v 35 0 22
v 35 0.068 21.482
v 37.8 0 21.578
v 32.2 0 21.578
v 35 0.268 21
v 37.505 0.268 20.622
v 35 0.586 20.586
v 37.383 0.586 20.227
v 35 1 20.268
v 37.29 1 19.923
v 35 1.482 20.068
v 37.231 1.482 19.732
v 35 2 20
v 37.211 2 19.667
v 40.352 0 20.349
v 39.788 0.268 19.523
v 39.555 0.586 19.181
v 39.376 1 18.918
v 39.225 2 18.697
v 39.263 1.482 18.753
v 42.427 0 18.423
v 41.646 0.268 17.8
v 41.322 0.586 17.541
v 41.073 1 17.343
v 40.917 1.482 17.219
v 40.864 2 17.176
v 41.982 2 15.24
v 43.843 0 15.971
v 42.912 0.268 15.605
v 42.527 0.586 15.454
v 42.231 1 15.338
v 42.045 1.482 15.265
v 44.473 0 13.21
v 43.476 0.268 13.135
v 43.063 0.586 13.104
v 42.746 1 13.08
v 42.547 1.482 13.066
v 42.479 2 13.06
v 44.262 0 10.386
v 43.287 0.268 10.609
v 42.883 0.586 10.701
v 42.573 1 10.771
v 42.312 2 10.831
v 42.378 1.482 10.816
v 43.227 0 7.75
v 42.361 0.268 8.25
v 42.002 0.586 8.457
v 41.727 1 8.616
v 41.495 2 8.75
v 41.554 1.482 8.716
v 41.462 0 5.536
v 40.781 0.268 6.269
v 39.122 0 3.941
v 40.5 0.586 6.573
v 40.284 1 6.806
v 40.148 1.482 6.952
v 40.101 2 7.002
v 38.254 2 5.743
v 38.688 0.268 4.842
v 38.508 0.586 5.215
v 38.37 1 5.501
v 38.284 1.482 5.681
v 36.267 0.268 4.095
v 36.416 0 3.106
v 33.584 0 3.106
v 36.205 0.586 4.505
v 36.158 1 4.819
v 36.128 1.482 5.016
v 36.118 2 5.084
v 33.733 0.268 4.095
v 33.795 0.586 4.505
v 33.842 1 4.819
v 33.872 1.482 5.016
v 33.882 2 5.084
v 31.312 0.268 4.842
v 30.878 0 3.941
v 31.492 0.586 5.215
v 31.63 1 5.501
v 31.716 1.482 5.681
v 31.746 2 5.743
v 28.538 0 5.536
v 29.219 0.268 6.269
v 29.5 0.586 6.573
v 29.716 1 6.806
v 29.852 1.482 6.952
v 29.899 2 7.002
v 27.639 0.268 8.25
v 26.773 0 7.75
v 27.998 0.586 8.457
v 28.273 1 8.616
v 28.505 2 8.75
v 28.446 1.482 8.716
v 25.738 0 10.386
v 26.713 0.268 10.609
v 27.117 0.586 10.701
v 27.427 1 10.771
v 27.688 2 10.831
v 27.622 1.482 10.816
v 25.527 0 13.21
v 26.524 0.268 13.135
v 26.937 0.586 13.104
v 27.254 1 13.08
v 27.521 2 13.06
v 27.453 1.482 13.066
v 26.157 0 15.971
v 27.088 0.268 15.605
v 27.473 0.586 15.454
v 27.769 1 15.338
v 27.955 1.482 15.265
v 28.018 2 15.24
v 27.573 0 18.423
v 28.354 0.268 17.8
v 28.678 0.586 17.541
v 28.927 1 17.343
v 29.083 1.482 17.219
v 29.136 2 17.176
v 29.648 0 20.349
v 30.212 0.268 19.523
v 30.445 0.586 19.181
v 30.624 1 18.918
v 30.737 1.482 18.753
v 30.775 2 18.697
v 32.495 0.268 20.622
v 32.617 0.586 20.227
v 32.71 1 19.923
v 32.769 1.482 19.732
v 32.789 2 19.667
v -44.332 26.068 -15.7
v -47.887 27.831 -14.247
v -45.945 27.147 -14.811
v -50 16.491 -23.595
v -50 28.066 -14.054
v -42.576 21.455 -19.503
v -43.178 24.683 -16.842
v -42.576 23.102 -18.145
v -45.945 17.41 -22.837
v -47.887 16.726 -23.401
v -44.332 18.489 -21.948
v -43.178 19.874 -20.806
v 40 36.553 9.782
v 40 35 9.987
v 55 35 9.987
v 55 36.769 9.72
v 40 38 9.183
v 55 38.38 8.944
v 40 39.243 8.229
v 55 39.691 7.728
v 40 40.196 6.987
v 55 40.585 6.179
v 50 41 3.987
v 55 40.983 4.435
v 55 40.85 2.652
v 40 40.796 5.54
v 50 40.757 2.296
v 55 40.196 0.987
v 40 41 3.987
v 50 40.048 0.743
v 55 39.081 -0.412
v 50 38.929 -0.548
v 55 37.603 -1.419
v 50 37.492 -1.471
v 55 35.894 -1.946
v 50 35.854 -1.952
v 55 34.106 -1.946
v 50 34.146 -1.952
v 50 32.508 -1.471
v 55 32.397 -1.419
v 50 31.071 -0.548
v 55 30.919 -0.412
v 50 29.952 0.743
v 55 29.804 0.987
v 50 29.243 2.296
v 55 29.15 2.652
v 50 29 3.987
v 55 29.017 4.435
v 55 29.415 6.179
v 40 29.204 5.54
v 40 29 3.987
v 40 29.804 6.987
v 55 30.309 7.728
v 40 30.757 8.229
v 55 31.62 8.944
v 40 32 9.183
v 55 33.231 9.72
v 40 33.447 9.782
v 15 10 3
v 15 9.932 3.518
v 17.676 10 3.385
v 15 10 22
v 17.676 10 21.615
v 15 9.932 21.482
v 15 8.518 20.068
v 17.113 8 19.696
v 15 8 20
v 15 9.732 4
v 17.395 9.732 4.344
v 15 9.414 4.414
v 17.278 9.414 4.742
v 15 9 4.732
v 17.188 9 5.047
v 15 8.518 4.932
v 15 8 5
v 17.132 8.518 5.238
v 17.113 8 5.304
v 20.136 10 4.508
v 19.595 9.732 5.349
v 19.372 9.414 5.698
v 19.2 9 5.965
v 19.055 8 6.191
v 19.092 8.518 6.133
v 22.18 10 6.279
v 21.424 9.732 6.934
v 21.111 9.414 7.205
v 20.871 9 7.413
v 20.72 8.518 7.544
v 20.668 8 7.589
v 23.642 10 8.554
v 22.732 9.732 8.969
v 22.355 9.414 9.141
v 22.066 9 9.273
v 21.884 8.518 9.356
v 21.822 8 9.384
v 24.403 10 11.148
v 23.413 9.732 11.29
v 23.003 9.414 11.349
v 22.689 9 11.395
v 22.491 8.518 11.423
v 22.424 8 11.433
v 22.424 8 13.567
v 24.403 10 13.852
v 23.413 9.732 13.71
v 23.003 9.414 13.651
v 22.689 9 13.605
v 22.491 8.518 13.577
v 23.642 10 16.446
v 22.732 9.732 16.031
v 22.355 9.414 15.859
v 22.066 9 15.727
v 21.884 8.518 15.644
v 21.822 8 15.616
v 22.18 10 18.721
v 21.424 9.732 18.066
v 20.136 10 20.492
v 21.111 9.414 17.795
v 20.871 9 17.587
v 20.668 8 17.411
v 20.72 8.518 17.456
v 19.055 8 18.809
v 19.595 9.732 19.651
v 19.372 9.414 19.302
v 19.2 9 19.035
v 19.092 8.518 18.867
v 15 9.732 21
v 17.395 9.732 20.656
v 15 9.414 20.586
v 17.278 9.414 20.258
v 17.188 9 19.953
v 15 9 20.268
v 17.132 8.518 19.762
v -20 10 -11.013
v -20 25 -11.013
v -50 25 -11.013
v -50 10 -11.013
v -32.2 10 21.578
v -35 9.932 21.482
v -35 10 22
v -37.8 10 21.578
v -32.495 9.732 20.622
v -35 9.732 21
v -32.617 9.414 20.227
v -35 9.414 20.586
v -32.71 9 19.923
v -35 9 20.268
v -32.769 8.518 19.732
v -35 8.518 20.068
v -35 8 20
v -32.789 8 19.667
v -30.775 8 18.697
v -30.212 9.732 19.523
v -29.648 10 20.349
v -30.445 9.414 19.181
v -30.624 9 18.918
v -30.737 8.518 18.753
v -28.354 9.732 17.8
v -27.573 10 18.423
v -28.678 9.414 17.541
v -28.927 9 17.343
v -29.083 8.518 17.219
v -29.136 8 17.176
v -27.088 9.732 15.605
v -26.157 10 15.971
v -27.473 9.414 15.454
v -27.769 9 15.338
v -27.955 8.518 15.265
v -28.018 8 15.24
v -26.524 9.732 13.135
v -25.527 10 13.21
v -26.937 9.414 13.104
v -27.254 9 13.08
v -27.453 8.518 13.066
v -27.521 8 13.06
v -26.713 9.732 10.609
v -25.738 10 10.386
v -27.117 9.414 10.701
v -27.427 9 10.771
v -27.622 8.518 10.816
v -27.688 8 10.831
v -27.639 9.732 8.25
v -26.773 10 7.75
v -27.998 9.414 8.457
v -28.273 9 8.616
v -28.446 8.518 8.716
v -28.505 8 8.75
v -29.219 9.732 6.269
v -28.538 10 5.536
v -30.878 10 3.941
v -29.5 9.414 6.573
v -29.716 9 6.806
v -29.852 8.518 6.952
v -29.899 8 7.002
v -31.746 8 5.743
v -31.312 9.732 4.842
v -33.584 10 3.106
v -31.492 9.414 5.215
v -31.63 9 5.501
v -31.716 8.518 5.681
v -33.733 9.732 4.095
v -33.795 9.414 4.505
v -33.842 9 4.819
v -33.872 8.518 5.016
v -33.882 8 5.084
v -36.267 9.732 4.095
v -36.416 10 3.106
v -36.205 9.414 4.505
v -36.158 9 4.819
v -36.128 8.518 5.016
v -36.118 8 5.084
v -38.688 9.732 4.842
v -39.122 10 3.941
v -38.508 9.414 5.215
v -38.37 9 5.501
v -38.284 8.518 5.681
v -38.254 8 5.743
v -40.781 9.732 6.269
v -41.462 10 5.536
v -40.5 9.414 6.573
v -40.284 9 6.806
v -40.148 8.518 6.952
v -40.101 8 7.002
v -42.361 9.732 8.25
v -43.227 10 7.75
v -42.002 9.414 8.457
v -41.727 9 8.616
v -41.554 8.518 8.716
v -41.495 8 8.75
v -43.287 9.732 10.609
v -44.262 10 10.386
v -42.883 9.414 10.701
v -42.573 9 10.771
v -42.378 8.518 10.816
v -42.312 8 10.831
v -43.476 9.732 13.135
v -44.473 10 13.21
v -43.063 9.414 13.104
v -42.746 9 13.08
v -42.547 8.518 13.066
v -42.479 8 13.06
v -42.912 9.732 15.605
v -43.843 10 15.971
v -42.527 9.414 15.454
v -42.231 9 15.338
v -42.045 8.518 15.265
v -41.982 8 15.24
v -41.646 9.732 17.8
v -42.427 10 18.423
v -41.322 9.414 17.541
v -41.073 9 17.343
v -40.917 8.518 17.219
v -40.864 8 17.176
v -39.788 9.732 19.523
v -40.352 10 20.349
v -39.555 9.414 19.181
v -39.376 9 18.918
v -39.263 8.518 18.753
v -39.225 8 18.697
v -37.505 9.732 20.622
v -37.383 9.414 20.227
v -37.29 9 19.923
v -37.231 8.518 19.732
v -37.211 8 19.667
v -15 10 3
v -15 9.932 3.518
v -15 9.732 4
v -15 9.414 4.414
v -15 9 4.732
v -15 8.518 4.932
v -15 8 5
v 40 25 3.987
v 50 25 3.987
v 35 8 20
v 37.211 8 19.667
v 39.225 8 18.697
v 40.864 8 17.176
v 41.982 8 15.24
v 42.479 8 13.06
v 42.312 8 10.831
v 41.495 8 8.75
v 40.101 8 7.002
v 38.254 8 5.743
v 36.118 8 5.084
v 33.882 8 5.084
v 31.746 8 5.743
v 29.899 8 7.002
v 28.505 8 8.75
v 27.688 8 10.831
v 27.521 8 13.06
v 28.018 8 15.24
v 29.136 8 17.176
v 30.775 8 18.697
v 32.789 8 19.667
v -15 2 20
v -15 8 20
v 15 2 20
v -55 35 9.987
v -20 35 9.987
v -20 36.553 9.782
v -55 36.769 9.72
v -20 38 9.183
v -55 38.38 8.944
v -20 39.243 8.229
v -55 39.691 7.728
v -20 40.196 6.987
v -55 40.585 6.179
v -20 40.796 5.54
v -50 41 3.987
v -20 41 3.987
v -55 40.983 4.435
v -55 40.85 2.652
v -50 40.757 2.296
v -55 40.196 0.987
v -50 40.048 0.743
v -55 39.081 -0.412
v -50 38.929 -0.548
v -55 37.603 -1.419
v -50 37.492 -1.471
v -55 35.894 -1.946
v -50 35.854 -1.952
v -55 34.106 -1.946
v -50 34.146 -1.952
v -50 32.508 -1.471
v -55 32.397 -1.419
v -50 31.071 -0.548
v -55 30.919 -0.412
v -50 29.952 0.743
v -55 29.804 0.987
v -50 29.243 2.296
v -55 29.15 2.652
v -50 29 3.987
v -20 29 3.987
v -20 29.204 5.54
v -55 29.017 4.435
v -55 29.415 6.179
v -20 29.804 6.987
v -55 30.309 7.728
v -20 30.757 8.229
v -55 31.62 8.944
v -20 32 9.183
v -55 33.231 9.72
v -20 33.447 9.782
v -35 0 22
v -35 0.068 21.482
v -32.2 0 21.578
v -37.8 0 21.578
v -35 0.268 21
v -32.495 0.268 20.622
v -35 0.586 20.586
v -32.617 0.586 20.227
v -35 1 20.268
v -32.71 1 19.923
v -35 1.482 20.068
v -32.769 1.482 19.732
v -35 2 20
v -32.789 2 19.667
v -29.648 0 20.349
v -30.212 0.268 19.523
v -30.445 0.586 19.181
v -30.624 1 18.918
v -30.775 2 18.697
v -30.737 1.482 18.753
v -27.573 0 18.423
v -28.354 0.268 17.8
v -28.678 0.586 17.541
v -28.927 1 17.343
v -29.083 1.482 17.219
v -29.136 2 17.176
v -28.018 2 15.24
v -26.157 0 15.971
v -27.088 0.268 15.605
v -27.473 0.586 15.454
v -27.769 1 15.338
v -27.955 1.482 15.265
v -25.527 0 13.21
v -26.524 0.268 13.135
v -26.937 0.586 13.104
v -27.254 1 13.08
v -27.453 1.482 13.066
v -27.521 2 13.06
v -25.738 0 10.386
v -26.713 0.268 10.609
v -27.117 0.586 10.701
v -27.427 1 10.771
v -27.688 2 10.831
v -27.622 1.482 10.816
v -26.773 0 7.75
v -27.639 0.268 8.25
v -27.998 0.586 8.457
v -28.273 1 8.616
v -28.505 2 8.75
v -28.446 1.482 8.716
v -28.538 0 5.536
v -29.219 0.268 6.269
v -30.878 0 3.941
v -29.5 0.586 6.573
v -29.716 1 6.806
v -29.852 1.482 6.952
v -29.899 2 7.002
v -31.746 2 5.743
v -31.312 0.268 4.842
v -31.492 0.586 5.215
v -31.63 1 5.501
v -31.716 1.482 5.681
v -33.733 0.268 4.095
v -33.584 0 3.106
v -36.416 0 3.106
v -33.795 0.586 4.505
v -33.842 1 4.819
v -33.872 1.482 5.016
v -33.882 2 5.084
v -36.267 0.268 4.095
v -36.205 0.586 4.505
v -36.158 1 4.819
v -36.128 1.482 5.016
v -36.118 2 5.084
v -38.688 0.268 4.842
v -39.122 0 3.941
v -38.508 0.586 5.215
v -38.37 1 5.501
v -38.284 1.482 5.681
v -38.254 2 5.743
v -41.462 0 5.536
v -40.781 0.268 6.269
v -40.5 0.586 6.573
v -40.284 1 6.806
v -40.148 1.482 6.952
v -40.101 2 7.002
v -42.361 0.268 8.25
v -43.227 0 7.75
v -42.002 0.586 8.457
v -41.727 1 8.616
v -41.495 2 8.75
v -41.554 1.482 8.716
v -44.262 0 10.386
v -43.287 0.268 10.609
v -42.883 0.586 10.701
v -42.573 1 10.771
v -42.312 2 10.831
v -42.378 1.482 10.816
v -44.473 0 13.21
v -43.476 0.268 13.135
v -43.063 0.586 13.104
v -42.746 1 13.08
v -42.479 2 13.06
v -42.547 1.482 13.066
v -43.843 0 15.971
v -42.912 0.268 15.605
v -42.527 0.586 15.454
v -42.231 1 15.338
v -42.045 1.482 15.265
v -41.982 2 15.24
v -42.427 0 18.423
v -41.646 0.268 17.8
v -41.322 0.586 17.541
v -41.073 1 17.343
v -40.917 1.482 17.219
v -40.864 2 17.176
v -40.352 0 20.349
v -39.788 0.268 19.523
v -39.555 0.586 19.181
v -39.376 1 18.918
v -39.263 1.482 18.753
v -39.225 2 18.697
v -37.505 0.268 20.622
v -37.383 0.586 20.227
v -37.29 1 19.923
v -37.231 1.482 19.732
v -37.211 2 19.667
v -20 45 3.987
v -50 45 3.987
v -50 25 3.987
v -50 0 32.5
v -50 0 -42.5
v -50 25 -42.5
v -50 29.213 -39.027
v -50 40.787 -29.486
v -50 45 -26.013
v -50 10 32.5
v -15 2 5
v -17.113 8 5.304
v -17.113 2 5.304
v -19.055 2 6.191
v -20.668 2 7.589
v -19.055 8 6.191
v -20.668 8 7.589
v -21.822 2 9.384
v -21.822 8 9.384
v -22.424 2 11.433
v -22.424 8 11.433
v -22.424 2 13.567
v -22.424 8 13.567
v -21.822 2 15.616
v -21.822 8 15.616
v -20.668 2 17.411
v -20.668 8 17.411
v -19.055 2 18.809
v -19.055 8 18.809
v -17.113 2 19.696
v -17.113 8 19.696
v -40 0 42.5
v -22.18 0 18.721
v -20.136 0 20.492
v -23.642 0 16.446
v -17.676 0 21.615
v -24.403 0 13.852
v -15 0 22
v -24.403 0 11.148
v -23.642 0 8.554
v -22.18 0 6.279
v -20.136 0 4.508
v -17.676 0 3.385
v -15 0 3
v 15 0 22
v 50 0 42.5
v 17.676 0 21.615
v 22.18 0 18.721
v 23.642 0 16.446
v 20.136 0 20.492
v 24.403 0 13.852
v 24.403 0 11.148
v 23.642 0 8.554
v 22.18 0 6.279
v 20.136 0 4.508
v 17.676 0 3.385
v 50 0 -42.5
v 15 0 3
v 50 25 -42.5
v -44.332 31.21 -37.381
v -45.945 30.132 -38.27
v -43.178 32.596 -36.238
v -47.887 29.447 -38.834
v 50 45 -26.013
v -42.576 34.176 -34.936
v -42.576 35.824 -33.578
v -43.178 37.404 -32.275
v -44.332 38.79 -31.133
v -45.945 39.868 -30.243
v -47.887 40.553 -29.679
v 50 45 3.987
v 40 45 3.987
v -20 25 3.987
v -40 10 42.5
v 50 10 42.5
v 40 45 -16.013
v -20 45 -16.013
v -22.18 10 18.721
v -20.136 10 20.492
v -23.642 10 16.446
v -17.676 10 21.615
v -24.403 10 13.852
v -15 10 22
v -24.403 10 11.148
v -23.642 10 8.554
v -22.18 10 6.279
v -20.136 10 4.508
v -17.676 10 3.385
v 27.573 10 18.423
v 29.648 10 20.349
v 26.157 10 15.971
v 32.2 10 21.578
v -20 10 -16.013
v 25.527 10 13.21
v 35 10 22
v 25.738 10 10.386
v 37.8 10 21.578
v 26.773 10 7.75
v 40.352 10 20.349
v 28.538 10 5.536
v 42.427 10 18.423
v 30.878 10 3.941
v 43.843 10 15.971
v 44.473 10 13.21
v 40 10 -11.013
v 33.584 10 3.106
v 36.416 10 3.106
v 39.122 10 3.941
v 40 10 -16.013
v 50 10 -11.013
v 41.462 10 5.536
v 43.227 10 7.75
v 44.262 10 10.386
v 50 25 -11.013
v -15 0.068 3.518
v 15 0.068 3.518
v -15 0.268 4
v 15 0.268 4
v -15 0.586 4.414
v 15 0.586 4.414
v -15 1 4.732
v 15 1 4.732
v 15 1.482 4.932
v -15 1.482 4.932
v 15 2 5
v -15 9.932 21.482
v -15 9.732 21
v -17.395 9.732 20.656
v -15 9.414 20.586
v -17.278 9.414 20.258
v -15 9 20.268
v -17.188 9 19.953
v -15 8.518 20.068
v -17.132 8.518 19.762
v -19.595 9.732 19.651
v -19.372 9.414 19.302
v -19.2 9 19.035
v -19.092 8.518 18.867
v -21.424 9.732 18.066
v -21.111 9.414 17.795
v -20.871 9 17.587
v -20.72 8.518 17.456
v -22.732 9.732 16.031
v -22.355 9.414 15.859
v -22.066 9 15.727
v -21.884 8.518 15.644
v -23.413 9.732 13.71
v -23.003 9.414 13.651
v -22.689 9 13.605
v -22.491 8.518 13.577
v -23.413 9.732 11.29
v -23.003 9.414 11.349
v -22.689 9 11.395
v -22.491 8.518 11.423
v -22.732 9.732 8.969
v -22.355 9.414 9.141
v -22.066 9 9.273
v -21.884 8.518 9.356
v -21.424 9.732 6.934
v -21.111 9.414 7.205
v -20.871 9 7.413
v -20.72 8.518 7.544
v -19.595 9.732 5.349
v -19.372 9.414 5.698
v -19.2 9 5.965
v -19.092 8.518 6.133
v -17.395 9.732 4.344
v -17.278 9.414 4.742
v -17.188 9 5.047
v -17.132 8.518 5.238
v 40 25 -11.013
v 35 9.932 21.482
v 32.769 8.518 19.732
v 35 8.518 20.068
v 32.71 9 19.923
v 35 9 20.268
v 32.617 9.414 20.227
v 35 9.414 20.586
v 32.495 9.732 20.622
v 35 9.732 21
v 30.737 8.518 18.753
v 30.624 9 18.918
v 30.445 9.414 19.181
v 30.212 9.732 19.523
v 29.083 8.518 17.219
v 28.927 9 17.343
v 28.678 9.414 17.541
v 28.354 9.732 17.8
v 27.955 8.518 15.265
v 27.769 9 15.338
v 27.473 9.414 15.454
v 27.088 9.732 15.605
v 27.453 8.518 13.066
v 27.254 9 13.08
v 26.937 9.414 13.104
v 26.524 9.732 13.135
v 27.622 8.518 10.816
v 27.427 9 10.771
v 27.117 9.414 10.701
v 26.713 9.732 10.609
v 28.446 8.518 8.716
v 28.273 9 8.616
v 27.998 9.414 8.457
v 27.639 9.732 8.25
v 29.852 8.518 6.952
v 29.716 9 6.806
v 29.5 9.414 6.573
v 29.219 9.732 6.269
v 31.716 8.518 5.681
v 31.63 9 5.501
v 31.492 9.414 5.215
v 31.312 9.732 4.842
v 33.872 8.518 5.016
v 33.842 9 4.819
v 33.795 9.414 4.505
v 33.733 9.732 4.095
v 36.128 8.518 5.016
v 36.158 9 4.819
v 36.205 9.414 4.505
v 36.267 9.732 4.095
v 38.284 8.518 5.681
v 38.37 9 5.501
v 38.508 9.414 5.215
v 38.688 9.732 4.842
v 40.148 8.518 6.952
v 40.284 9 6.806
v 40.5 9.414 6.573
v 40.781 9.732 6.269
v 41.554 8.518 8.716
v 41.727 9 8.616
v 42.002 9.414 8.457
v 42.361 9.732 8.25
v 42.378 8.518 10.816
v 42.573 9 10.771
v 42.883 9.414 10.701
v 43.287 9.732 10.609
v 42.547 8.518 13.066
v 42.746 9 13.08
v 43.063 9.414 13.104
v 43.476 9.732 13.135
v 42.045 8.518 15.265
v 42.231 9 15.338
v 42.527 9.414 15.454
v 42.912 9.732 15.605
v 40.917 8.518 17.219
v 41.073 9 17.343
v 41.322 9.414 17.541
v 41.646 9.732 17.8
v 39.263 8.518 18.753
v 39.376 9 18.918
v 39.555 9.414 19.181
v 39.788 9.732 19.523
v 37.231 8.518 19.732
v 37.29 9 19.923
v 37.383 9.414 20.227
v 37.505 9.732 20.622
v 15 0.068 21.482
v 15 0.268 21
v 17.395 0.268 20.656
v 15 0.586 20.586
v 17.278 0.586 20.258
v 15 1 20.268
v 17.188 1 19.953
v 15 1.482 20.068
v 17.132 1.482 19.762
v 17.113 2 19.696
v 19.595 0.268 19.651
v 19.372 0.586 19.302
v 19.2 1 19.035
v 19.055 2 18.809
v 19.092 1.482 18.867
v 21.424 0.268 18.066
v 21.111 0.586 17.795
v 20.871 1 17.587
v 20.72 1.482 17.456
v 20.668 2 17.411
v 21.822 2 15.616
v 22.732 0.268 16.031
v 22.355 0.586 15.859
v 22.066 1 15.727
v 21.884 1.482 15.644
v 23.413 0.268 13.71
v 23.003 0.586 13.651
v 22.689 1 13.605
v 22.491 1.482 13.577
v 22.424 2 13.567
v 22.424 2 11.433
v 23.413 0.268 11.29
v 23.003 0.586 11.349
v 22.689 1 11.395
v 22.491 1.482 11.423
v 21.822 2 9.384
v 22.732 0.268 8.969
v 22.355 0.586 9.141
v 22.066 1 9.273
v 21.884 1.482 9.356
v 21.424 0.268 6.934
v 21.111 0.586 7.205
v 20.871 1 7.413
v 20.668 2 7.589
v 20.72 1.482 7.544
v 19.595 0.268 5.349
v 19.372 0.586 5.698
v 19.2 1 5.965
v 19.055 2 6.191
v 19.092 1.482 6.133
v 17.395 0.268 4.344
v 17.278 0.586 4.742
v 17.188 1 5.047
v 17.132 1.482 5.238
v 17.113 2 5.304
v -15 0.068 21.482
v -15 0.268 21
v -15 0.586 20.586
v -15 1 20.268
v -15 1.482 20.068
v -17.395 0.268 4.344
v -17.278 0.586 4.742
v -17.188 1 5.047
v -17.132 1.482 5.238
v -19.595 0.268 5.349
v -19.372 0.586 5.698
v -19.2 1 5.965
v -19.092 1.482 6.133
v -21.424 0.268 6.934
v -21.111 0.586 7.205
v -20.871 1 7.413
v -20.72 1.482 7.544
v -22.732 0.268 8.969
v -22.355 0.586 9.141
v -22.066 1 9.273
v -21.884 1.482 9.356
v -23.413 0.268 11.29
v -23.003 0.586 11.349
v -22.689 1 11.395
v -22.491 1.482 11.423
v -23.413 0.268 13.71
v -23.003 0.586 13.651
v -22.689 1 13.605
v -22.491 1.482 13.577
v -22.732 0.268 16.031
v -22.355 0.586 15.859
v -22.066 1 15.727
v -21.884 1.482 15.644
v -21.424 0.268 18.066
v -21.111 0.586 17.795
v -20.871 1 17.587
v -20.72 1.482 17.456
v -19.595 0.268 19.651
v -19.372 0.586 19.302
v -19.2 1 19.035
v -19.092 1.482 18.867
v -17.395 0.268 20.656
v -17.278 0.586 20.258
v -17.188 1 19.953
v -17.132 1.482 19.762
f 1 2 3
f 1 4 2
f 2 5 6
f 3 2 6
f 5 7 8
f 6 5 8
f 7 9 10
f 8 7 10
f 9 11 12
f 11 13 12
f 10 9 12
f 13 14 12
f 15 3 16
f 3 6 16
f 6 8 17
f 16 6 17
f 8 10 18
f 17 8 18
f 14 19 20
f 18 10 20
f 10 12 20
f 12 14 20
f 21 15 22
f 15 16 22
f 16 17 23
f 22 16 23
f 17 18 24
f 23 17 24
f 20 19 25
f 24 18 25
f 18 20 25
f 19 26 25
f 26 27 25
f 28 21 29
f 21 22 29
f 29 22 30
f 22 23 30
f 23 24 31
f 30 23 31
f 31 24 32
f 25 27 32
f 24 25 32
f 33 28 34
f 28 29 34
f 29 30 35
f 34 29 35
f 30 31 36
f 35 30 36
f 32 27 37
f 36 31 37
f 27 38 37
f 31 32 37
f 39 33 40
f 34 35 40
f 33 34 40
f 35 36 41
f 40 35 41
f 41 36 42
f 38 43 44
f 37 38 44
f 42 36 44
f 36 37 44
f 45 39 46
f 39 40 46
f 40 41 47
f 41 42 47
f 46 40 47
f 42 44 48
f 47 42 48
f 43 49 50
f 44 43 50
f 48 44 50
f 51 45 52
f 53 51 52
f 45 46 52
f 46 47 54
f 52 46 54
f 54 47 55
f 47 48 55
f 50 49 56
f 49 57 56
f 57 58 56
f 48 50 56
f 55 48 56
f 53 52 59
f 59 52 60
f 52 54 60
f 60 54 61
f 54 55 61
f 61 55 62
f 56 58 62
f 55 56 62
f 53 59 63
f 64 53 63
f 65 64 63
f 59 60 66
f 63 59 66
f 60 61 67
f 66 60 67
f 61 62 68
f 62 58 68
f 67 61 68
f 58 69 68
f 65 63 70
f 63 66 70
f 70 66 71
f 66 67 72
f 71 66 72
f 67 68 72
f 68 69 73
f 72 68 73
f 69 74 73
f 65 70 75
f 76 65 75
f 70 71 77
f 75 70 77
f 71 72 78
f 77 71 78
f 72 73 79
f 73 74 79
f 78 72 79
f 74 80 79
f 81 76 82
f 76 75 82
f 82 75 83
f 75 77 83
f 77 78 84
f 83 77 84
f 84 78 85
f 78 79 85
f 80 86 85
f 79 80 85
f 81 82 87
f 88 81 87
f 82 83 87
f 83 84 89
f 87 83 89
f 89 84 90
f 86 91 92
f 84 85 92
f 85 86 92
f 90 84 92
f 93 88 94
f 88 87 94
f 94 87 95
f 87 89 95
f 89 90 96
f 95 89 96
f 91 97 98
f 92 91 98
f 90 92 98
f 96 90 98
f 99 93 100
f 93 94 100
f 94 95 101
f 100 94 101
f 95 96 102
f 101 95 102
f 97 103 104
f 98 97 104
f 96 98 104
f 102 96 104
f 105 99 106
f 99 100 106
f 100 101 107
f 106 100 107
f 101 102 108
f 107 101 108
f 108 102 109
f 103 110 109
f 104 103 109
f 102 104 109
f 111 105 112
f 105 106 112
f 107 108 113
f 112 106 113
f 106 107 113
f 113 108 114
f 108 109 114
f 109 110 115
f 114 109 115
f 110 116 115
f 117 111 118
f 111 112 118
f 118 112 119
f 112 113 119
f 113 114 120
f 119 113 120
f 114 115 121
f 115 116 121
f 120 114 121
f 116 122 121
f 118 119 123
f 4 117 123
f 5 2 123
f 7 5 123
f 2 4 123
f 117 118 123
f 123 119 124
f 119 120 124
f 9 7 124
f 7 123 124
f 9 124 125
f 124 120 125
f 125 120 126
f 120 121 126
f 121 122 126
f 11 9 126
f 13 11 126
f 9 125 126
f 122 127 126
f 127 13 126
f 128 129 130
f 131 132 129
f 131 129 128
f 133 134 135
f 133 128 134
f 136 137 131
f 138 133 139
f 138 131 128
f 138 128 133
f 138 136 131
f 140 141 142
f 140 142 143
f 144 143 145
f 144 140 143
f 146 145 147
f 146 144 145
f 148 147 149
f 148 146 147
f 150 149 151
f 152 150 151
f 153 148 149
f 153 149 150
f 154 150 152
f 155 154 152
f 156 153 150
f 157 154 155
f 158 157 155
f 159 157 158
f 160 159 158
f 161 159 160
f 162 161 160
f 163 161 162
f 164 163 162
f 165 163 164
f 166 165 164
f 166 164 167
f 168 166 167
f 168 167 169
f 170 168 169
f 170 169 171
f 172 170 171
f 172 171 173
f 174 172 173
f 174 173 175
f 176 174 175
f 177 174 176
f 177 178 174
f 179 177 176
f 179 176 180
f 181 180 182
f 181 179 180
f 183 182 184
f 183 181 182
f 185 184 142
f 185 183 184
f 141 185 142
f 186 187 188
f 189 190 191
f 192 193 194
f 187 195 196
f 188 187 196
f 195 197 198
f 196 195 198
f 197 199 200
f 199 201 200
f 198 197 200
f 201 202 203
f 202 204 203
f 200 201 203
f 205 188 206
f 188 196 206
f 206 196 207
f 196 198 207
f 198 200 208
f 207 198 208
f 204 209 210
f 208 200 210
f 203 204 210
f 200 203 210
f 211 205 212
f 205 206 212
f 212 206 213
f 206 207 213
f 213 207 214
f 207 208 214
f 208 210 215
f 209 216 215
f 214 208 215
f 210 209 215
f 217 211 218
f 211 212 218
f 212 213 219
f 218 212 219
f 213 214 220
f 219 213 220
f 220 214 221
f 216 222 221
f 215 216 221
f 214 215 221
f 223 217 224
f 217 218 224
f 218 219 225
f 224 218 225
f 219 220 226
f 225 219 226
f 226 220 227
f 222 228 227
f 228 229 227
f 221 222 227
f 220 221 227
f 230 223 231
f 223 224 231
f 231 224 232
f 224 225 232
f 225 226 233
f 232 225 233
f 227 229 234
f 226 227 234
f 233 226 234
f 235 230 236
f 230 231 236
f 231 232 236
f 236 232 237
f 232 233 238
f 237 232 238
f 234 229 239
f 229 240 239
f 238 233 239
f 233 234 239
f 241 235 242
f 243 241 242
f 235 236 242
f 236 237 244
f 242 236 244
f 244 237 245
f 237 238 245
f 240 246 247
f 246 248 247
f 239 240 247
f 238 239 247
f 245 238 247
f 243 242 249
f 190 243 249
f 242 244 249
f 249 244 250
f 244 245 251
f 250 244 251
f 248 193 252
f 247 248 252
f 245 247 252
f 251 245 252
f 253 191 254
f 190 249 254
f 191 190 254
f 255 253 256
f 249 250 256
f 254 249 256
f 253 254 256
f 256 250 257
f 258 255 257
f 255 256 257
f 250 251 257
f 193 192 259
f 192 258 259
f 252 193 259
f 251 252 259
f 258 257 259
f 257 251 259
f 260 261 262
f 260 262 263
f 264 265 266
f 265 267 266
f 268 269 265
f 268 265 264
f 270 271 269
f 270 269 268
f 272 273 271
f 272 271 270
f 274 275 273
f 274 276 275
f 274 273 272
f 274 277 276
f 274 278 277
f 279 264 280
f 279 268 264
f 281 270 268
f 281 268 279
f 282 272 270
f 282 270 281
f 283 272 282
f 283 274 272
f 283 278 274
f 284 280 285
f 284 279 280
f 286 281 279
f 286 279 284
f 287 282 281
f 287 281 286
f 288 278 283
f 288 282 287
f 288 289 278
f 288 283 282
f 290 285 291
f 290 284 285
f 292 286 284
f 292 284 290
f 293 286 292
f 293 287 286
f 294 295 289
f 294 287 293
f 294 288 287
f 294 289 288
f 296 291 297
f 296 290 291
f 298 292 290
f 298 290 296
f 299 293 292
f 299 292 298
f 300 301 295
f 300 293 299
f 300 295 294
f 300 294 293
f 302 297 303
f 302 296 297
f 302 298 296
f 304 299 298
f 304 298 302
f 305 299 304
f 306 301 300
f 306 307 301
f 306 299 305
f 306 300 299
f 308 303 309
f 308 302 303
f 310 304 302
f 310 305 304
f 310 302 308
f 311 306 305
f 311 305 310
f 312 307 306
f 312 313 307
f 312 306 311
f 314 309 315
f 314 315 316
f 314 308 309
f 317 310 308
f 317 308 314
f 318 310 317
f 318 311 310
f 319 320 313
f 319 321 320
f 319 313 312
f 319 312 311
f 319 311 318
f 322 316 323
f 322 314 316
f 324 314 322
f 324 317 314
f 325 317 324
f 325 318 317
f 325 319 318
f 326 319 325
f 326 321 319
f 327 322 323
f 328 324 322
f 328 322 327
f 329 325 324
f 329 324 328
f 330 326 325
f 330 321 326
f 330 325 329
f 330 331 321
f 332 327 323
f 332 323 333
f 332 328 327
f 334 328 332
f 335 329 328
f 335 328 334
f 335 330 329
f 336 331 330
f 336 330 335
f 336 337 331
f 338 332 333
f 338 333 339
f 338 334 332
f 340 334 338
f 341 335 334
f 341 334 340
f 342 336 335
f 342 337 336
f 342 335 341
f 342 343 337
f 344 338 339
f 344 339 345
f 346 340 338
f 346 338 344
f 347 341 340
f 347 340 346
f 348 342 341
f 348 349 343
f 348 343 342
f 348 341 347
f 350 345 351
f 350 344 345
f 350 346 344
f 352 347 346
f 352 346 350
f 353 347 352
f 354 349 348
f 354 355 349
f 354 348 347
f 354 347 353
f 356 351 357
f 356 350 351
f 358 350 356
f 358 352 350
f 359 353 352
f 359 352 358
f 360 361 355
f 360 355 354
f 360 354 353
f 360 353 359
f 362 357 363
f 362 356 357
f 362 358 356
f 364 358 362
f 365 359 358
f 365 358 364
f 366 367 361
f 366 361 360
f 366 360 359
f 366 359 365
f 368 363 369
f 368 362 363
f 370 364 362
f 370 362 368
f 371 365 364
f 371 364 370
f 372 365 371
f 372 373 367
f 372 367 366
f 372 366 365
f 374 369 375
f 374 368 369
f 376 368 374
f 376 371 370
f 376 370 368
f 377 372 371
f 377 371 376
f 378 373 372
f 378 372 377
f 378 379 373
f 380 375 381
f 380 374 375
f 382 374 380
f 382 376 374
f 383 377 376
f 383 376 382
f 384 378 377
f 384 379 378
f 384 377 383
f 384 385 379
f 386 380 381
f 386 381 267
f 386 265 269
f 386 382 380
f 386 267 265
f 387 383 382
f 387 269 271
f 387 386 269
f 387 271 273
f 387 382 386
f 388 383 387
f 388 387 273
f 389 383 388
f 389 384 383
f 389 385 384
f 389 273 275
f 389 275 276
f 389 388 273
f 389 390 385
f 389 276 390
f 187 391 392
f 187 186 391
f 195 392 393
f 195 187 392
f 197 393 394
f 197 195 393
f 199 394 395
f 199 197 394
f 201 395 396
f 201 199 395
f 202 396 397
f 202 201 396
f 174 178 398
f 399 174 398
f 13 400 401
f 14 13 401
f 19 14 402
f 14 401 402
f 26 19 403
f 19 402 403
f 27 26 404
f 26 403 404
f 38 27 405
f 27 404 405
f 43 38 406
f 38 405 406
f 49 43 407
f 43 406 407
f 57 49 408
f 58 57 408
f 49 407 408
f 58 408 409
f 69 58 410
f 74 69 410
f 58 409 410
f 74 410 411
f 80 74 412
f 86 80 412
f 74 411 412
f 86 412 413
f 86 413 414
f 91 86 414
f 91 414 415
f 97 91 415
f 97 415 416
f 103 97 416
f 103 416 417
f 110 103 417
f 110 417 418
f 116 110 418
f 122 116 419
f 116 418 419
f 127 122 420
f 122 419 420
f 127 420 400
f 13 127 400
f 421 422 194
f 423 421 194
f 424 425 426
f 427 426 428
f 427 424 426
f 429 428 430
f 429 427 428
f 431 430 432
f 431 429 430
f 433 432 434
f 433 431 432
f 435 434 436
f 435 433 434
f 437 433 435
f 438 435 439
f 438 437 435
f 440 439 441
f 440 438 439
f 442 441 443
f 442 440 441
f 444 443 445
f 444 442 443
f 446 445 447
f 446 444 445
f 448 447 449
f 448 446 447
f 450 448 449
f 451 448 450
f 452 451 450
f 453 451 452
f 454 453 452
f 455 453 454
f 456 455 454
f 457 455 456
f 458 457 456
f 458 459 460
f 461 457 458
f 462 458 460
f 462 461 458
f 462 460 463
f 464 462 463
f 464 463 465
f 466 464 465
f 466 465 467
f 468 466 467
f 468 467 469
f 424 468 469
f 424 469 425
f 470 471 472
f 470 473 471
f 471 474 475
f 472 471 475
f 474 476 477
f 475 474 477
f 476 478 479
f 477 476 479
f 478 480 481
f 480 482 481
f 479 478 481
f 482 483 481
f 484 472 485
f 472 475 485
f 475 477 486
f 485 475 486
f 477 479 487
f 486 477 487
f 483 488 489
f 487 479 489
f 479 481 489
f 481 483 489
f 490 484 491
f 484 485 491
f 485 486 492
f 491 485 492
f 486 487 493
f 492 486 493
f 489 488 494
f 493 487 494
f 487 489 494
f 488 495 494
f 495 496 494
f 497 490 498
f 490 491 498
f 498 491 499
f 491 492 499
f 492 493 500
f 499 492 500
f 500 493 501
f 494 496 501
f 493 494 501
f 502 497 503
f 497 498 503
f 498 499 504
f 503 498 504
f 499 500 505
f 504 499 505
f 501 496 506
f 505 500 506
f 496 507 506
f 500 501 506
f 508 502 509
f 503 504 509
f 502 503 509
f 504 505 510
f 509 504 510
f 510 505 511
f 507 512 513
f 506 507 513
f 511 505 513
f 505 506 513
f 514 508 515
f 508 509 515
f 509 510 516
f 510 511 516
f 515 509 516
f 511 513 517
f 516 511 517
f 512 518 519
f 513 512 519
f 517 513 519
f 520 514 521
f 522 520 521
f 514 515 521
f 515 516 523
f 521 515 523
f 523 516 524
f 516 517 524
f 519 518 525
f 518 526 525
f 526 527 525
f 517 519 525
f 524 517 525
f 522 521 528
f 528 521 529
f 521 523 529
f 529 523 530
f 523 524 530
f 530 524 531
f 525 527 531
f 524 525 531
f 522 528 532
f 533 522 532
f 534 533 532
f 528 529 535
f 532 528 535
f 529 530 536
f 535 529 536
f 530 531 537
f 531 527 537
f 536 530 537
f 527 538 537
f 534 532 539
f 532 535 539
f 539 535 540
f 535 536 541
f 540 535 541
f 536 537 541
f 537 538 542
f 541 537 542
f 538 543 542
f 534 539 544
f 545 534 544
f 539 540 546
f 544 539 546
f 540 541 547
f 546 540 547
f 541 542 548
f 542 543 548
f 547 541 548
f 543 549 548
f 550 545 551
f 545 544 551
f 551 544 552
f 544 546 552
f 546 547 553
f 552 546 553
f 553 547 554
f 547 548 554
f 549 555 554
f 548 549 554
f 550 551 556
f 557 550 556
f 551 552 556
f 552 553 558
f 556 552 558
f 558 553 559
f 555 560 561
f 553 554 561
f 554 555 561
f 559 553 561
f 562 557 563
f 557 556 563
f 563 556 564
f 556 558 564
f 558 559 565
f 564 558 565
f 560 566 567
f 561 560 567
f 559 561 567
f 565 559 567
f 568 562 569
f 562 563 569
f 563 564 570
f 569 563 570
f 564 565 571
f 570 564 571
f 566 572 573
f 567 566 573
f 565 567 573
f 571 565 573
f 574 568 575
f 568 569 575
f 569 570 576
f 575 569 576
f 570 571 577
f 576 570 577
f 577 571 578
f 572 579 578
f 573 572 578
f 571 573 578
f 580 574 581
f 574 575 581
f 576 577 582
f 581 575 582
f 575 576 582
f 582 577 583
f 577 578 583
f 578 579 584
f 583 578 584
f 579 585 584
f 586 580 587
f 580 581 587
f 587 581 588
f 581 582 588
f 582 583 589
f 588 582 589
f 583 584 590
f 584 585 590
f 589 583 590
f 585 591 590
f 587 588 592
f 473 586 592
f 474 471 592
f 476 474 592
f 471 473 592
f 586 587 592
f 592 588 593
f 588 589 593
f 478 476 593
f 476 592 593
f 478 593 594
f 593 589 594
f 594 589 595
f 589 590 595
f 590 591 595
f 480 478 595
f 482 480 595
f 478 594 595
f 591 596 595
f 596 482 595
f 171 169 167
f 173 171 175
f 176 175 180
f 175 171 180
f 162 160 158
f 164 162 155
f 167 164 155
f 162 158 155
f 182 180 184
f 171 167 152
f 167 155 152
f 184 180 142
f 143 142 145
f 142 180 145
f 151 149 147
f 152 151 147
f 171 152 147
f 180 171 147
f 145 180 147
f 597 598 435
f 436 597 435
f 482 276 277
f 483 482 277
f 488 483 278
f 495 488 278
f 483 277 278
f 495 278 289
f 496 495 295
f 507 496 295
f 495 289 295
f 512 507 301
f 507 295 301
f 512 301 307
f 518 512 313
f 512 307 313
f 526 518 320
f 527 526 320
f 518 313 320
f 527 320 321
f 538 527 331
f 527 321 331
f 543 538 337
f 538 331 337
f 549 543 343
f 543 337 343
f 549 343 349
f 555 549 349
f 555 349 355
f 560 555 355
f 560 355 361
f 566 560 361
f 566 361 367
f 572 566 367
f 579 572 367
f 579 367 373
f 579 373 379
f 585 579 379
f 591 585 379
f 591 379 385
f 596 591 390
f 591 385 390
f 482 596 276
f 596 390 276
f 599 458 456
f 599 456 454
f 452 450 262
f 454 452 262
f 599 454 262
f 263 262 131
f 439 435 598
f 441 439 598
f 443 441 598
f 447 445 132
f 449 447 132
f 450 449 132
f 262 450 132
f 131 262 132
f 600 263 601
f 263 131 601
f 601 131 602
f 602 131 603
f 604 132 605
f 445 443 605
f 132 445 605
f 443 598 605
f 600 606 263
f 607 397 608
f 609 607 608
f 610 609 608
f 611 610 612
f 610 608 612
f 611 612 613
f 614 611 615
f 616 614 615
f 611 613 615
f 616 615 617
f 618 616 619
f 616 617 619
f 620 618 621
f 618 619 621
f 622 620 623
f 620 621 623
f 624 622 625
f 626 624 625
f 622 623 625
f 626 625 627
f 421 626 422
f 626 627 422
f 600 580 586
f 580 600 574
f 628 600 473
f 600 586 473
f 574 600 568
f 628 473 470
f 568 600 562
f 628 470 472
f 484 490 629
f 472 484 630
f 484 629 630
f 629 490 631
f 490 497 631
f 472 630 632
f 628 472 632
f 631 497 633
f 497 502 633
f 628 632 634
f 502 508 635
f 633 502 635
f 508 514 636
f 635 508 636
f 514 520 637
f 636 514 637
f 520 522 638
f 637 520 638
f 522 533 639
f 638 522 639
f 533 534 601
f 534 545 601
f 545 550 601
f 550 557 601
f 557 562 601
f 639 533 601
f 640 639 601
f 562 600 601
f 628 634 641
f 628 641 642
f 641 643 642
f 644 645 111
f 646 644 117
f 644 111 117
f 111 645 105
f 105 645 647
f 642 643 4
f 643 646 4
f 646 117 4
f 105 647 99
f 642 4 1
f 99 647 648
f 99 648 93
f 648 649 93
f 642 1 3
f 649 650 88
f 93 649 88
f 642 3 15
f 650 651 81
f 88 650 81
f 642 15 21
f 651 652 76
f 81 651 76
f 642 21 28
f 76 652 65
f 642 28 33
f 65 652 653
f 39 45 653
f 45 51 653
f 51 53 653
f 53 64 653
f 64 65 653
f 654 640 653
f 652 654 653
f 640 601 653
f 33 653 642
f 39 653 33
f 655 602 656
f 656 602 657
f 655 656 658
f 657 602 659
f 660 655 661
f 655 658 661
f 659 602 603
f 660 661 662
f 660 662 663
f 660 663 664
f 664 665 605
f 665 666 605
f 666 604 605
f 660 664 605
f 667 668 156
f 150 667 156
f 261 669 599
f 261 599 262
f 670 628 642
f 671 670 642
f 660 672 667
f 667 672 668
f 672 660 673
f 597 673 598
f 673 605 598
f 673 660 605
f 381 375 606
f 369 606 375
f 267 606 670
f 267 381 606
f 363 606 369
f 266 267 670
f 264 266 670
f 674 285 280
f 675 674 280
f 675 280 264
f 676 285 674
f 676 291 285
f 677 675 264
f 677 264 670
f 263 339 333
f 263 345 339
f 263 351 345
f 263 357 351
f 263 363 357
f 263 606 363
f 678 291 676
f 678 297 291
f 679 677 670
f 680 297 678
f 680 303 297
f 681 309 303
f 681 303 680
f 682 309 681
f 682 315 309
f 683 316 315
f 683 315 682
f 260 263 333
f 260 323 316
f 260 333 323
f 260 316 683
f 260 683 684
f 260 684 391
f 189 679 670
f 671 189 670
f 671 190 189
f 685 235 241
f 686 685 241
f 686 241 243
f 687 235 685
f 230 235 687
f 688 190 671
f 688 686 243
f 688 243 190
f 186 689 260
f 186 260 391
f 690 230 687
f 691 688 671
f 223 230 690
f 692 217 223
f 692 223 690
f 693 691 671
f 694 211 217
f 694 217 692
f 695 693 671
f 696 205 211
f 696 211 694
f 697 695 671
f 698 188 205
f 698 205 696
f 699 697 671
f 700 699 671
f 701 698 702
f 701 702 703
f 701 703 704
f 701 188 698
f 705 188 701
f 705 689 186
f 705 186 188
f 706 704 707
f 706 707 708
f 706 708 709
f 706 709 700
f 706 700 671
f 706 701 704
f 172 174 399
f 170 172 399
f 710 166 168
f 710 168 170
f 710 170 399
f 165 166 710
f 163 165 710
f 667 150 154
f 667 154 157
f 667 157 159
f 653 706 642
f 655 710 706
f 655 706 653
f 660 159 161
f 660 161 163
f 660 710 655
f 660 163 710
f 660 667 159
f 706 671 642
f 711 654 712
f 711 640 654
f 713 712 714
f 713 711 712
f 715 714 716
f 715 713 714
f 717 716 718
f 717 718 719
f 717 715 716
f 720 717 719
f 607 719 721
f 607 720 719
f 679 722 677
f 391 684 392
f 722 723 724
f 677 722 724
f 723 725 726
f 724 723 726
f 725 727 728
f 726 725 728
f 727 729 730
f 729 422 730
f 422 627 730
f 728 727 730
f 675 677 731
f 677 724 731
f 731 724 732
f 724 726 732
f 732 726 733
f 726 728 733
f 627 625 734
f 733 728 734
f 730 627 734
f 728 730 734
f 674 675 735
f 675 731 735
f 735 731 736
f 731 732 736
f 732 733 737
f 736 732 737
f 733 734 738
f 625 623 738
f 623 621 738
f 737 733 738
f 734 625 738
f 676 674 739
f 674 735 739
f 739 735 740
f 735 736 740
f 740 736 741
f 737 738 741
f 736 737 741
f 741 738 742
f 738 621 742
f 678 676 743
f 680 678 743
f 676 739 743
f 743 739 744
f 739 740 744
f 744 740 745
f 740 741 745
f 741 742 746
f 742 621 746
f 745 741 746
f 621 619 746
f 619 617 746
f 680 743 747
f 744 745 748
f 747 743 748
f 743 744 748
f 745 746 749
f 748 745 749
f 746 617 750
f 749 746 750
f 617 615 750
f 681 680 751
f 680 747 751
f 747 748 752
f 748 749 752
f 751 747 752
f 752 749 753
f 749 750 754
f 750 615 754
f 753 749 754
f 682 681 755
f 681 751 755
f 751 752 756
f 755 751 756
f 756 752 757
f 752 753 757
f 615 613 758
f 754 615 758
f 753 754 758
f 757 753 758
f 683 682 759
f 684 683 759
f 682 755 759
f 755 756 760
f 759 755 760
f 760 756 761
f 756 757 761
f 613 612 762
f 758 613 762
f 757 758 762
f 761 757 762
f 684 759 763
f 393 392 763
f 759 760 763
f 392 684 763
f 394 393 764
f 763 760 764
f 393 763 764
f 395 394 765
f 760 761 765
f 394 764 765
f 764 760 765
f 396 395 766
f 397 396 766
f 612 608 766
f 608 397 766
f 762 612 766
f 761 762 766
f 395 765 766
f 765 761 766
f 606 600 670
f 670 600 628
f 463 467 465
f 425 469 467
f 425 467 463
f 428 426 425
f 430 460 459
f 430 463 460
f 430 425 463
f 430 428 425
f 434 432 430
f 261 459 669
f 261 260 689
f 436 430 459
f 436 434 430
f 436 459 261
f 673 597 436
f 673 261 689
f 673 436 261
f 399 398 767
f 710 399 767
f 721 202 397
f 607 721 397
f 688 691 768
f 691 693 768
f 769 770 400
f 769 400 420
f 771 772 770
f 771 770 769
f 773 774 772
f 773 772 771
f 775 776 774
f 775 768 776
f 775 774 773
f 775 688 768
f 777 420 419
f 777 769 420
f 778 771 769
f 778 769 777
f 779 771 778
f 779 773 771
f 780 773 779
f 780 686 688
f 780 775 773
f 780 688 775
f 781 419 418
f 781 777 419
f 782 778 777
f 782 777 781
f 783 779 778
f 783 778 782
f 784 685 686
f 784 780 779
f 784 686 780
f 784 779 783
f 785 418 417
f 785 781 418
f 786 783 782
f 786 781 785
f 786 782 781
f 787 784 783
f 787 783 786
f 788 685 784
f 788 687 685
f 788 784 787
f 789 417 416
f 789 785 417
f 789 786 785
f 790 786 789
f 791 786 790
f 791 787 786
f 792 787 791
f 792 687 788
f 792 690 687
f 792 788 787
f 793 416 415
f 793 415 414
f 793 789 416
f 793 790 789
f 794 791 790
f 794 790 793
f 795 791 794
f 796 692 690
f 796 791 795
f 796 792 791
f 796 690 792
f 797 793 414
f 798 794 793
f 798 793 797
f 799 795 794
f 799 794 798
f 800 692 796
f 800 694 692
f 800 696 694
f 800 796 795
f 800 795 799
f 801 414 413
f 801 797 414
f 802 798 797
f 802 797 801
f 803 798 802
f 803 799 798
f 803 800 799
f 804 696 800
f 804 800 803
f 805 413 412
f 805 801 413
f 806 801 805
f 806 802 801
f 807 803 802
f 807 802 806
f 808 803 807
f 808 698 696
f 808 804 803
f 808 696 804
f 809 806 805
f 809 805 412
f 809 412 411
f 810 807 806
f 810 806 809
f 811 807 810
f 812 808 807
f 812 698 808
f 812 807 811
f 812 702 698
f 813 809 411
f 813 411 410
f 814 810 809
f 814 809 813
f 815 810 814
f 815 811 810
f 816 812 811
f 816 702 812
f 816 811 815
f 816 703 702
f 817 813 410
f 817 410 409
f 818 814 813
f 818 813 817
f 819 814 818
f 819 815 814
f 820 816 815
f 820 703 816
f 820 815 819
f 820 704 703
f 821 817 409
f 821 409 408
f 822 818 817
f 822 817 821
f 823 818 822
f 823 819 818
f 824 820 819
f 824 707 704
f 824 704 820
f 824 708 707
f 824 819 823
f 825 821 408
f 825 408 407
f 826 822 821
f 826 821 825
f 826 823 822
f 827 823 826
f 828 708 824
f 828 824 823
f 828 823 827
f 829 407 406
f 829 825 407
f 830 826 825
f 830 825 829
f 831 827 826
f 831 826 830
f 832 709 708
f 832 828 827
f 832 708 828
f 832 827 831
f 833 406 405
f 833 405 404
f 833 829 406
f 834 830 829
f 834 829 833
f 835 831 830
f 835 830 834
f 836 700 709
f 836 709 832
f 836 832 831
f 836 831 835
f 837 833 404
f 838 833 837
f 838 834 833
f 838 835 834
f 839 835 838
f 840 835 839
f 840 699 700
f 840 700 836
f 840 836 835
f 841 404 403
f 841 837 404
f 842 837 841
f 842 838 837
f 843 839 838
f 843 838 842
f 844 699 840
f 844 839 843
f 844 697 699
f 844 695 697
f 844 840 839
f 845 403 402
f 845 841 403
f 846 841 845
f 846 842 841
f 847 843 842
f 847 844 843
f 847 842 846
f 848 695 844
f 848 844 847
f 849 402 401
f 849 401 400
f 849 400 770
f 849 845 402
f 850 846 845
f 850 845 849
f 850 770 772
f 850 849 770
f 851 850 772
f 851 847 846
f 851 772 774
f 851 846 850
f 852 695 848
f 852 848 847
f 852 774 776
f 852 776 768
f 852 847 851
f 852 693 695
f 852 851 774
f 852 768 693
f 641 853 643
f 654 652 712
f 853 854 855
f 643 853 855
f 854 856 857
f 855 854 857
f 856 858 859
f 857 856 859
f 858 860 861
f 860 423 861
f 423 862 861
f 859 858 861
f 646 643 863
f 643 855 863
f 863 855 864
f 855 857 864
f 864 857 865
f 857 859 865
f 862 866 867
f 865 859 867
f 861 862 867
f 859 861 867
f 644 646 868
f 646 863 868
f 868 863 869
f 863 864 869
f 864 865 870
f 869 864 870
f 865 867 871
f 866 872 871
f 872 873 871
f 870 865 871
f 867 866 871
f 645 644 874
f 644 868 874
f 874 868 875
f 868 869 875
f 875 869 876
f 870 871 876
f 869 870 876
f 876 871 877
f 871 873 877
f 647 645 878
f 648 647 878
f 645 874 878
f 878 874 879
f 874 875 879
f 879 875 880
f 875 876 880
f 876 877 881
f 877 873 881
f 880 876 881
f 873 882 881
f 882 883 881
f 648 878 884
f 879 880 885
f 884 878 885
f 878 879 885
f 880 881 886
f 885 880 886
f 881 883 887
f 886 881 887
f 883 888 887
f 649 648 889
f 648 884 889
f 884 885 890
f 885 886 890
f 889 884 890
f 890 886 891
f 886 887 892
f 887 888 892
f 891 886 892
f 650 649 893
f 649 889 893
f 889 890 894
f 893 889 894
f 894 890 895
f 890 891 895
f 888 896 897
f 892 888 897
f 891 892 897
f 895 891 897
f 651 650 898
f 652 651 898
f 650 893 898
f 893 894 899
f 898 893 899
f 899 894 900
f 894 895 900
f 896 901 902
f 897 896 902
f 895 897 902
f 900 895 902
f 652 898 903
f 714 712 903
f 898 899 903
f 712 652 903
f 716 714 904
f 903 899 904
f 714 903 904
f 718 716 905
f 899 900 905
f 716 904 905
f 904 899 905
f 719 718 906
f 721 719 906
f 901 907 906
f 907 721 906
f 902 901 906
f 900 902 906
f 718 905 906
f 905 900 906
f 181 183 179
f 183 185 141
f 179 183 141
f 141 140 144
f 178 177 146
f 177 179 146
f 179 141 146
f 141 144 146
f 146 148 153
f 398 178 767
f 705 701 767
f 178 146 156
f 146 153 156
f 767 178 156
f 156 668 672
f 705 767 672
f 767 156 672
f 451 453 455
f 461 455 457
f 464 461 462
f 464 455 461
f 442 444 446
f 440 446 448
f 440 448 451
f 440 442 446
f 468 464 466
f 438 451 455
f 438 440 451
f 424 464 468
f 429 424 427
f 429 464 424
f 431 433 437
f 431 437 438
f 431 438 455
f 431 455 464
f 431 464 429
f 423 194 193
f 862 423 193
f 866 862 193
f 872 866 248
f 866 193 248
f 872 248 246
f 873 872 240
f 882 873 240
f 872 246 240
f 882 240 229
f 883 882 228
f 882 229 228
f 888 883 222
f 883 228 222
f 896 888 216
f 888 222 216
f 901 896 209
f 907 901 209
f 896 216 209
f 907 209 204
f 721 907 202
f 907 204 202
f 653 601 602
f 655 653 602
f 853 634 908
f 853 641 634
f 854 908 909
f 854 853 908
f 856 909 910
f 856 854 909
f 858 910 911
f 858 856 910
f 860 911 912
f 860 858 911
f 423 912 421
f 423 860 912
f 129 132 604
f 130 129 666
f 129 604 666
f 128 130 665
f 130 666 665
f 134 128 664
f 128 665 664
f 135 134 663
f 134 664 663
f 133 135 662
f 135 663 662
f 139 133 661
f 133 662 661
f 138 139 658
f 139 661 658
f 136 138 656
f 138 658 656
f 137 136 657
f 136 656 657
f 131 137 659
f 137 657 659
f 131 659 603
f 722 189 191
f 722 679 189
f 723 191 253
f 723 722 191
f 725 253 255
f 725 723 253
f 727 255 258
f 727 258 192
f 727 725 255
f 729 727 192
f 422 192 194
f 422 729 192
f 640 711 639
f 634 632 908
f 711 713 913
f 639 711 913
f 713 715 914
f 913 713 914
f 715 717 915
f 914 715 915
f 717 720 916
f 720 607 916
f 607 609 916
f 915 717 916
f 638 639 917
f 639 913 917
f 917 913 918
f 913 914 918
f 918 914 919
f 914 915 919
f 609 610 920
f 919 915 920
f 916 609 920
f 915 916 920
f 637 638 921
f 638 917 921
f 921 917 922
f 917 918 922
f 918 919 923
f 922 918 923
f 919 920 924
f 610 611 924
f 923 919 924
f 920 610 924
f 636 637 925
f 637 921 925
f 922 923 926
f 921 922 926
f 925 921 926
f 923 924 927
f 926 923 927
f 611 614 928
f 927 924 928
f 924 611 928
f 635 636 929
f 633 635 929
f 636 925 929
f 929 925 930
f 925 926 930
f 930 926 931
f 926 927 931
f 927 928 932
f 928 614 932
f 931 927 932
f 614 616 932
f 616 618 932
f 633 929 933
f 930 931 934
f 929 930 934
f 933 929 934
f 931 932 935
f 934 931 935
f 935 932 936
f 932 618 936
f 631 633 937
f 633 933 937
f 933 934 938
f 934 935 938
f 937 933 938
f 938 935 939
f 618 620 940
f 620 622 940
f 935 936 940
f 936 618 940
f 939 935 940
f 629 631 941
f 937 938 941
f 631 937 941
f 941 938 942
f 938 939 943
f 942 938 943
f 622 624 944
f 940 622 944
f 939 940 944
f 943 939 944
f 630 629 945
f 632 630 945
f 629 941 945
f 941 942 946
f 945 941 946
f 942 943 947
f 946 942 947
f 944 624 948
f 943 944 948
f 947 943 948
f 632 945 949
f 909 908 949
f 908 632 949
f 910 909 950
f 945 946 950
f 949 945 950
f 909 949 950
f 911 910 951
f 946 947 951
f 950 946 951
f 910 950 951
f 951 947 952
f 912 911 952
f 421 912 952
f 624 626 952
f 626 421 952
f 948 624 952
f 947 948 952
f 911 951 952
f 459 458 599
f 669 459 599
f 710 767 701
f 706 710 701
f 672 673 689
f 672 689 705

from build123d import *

# Parameters (mm, degrees)
BOSS_EXTRUDE1_DEPTH = 10
SKETCH2_R           = 7.5
CUT_EXTRUDE1_DEPTH  = 10
BOSS_EXTRUDE2_DEPTH = 100
BOSS_EXTRUDE3_START = 5
SKETCH4_R           = 6
BOSS_EXTRUDE3_DEPTH = 110
SKETCH5_R           = 7.5
CUT_EXTRUDE2_DEPTH  = 20
CUT_EXTRUDE3_REACH  = 84.802
SKETCH6_W           = 60
SKETCH6_H           = 36.196547207
FILLET1_R           = 2


with BuildPart() as part:
    # Sketch1 → Boss-Extrude1 (new body)
    with BuildSketch(Plane(origin=(0, 0, 0), x_dir=(1, 0, 0), z_dir=(0, 1, 0))):
        Polygon((-50, -32.5), (-40, -42.5), (50, -42.5), (50, 42.5), (-50, 42.5), align=None)
    extrude(amount=BOSS_EXTRUDE1_DEPTH)

    # Sketch2 → Cut-Extrude1 (cut)
    with BuildSketch(Plane(origin=(0, 10, 0), x_dir=(1, 0, 0), z_dir=(0, 1, 0))):
        with Locations(Location((-35, -12.5, 0), (0, 0, 270))):
            Circle(SKETCH2_R)
        with Locations(Location((35, -12.5, 0), (0, 0, 270))):
            Circle(SKETCH2_R)
        with BuildLine():
            Line((15, -5), (-15, -5))
            ThreePointArc((-15, -5), (-22.5, -12.5), (-15, -20))
            Line((-15, -20), (15, -20))
            ThreePointArc((15, -20), (22.5, -12.5), (15, -5))
        make_face()
    extrude(amount=-CUT_EXTRUDE1_DEPTH, mode=Mode.SUBTRACT)

    # Sketch3 → Boss-Extrude2 (add)
    with BuildSketch(Plane.ZY.offset(50)):
        Polygon((-42.5, 10), (-42.5, 25), (-26.013272284, 45), (3.986727716, 45), (3.986727716, 25), (-11.013272284, 25), (-11.013272284, 10), align=None)
    extrude(amount=-BOSS_EXTRUDE2_DEPTH)

    # Sketch4 → Boss-Extrude3 (add)
    with BuildSketch(Plane.ZY.offset(50).offset(BOSS_EXTRUDE3_START)):
        with Locations((3.986727716, 35)):
            Circle(SKETCH4_R)
    extrude(amount=-BOSS_EXTRUDE3_DEPTH)

    # Sketch5 → Cut-Extrude2 (cut)
    with BuildSketch(Plane(origin=(0, 30.974465206, -37.575030945), x_dir=(1, 0, 0), z_dir=(0, 0.636078220277765, -0.7716245833877192))):
        with Locations((-50, -5.216960269)):
            Circle(SKETCH5_R)
    extrude(amount=-CUT_EXTRUDE2_DEPTH, mode=Mode.SUBTRACT)

    # Cut-Extrude3: up to this face of the body (flat: up to its plane)
    cut_extrude3_end = Plane(part.part.faces().sort_by_distance((-48.865818784, 10, 10.743363858))[0])
    # Sketch6 → Cut-Extrude3 (cut, up to the picked face)
    with BuildSketch(Plane(origin=(0, 45, 0), x_dir=(1, 0, 0), z_dir=(0, 1, 0)), mode=Mode.PRIVATE) as cut_extrude3_sk1:
        with Locations((10, -2.08500132)):
            Rectangle(SKETCH6_W, SKETCH6_H)
    cut_extrude3_tool1 = split(extrude(cut_extrude3_sk1.sketch, amount=-CUT_EXTRUDE3_REACH, mode=Mode.PRIVATE), bisect_by=cut_extrude3_end, keep=Keep.BOTH, mode=Mode.PRIVATE)
    add(cut_extrude3_tool1.solids().sort_by(Axis((10, 45, 2.085001), (0, -1, 0)))[0], mode=Mode.SUBTRACT)

    # Fillet1
    fillet1_edges = [part.edges().sort_by_distance(p)[0] for p in [
        (-35, 0, 5),
        (-35, 10, 5),
        (35, 0, 5),
        (35, 10, 5),
        (-22.5, 0, 12.5),
        (0, 0, 5),
        (22.5, 0, 12.5),
        (0, 0, 20),
        (-22.5, 10, 12.5),
        (0, 10, 20),
        (22.5, 10, 12.5),
        (0, 10, 5),
    ]]
    fillet(fillet1_edges, radius=FILLET1_R)


solid = part.part
